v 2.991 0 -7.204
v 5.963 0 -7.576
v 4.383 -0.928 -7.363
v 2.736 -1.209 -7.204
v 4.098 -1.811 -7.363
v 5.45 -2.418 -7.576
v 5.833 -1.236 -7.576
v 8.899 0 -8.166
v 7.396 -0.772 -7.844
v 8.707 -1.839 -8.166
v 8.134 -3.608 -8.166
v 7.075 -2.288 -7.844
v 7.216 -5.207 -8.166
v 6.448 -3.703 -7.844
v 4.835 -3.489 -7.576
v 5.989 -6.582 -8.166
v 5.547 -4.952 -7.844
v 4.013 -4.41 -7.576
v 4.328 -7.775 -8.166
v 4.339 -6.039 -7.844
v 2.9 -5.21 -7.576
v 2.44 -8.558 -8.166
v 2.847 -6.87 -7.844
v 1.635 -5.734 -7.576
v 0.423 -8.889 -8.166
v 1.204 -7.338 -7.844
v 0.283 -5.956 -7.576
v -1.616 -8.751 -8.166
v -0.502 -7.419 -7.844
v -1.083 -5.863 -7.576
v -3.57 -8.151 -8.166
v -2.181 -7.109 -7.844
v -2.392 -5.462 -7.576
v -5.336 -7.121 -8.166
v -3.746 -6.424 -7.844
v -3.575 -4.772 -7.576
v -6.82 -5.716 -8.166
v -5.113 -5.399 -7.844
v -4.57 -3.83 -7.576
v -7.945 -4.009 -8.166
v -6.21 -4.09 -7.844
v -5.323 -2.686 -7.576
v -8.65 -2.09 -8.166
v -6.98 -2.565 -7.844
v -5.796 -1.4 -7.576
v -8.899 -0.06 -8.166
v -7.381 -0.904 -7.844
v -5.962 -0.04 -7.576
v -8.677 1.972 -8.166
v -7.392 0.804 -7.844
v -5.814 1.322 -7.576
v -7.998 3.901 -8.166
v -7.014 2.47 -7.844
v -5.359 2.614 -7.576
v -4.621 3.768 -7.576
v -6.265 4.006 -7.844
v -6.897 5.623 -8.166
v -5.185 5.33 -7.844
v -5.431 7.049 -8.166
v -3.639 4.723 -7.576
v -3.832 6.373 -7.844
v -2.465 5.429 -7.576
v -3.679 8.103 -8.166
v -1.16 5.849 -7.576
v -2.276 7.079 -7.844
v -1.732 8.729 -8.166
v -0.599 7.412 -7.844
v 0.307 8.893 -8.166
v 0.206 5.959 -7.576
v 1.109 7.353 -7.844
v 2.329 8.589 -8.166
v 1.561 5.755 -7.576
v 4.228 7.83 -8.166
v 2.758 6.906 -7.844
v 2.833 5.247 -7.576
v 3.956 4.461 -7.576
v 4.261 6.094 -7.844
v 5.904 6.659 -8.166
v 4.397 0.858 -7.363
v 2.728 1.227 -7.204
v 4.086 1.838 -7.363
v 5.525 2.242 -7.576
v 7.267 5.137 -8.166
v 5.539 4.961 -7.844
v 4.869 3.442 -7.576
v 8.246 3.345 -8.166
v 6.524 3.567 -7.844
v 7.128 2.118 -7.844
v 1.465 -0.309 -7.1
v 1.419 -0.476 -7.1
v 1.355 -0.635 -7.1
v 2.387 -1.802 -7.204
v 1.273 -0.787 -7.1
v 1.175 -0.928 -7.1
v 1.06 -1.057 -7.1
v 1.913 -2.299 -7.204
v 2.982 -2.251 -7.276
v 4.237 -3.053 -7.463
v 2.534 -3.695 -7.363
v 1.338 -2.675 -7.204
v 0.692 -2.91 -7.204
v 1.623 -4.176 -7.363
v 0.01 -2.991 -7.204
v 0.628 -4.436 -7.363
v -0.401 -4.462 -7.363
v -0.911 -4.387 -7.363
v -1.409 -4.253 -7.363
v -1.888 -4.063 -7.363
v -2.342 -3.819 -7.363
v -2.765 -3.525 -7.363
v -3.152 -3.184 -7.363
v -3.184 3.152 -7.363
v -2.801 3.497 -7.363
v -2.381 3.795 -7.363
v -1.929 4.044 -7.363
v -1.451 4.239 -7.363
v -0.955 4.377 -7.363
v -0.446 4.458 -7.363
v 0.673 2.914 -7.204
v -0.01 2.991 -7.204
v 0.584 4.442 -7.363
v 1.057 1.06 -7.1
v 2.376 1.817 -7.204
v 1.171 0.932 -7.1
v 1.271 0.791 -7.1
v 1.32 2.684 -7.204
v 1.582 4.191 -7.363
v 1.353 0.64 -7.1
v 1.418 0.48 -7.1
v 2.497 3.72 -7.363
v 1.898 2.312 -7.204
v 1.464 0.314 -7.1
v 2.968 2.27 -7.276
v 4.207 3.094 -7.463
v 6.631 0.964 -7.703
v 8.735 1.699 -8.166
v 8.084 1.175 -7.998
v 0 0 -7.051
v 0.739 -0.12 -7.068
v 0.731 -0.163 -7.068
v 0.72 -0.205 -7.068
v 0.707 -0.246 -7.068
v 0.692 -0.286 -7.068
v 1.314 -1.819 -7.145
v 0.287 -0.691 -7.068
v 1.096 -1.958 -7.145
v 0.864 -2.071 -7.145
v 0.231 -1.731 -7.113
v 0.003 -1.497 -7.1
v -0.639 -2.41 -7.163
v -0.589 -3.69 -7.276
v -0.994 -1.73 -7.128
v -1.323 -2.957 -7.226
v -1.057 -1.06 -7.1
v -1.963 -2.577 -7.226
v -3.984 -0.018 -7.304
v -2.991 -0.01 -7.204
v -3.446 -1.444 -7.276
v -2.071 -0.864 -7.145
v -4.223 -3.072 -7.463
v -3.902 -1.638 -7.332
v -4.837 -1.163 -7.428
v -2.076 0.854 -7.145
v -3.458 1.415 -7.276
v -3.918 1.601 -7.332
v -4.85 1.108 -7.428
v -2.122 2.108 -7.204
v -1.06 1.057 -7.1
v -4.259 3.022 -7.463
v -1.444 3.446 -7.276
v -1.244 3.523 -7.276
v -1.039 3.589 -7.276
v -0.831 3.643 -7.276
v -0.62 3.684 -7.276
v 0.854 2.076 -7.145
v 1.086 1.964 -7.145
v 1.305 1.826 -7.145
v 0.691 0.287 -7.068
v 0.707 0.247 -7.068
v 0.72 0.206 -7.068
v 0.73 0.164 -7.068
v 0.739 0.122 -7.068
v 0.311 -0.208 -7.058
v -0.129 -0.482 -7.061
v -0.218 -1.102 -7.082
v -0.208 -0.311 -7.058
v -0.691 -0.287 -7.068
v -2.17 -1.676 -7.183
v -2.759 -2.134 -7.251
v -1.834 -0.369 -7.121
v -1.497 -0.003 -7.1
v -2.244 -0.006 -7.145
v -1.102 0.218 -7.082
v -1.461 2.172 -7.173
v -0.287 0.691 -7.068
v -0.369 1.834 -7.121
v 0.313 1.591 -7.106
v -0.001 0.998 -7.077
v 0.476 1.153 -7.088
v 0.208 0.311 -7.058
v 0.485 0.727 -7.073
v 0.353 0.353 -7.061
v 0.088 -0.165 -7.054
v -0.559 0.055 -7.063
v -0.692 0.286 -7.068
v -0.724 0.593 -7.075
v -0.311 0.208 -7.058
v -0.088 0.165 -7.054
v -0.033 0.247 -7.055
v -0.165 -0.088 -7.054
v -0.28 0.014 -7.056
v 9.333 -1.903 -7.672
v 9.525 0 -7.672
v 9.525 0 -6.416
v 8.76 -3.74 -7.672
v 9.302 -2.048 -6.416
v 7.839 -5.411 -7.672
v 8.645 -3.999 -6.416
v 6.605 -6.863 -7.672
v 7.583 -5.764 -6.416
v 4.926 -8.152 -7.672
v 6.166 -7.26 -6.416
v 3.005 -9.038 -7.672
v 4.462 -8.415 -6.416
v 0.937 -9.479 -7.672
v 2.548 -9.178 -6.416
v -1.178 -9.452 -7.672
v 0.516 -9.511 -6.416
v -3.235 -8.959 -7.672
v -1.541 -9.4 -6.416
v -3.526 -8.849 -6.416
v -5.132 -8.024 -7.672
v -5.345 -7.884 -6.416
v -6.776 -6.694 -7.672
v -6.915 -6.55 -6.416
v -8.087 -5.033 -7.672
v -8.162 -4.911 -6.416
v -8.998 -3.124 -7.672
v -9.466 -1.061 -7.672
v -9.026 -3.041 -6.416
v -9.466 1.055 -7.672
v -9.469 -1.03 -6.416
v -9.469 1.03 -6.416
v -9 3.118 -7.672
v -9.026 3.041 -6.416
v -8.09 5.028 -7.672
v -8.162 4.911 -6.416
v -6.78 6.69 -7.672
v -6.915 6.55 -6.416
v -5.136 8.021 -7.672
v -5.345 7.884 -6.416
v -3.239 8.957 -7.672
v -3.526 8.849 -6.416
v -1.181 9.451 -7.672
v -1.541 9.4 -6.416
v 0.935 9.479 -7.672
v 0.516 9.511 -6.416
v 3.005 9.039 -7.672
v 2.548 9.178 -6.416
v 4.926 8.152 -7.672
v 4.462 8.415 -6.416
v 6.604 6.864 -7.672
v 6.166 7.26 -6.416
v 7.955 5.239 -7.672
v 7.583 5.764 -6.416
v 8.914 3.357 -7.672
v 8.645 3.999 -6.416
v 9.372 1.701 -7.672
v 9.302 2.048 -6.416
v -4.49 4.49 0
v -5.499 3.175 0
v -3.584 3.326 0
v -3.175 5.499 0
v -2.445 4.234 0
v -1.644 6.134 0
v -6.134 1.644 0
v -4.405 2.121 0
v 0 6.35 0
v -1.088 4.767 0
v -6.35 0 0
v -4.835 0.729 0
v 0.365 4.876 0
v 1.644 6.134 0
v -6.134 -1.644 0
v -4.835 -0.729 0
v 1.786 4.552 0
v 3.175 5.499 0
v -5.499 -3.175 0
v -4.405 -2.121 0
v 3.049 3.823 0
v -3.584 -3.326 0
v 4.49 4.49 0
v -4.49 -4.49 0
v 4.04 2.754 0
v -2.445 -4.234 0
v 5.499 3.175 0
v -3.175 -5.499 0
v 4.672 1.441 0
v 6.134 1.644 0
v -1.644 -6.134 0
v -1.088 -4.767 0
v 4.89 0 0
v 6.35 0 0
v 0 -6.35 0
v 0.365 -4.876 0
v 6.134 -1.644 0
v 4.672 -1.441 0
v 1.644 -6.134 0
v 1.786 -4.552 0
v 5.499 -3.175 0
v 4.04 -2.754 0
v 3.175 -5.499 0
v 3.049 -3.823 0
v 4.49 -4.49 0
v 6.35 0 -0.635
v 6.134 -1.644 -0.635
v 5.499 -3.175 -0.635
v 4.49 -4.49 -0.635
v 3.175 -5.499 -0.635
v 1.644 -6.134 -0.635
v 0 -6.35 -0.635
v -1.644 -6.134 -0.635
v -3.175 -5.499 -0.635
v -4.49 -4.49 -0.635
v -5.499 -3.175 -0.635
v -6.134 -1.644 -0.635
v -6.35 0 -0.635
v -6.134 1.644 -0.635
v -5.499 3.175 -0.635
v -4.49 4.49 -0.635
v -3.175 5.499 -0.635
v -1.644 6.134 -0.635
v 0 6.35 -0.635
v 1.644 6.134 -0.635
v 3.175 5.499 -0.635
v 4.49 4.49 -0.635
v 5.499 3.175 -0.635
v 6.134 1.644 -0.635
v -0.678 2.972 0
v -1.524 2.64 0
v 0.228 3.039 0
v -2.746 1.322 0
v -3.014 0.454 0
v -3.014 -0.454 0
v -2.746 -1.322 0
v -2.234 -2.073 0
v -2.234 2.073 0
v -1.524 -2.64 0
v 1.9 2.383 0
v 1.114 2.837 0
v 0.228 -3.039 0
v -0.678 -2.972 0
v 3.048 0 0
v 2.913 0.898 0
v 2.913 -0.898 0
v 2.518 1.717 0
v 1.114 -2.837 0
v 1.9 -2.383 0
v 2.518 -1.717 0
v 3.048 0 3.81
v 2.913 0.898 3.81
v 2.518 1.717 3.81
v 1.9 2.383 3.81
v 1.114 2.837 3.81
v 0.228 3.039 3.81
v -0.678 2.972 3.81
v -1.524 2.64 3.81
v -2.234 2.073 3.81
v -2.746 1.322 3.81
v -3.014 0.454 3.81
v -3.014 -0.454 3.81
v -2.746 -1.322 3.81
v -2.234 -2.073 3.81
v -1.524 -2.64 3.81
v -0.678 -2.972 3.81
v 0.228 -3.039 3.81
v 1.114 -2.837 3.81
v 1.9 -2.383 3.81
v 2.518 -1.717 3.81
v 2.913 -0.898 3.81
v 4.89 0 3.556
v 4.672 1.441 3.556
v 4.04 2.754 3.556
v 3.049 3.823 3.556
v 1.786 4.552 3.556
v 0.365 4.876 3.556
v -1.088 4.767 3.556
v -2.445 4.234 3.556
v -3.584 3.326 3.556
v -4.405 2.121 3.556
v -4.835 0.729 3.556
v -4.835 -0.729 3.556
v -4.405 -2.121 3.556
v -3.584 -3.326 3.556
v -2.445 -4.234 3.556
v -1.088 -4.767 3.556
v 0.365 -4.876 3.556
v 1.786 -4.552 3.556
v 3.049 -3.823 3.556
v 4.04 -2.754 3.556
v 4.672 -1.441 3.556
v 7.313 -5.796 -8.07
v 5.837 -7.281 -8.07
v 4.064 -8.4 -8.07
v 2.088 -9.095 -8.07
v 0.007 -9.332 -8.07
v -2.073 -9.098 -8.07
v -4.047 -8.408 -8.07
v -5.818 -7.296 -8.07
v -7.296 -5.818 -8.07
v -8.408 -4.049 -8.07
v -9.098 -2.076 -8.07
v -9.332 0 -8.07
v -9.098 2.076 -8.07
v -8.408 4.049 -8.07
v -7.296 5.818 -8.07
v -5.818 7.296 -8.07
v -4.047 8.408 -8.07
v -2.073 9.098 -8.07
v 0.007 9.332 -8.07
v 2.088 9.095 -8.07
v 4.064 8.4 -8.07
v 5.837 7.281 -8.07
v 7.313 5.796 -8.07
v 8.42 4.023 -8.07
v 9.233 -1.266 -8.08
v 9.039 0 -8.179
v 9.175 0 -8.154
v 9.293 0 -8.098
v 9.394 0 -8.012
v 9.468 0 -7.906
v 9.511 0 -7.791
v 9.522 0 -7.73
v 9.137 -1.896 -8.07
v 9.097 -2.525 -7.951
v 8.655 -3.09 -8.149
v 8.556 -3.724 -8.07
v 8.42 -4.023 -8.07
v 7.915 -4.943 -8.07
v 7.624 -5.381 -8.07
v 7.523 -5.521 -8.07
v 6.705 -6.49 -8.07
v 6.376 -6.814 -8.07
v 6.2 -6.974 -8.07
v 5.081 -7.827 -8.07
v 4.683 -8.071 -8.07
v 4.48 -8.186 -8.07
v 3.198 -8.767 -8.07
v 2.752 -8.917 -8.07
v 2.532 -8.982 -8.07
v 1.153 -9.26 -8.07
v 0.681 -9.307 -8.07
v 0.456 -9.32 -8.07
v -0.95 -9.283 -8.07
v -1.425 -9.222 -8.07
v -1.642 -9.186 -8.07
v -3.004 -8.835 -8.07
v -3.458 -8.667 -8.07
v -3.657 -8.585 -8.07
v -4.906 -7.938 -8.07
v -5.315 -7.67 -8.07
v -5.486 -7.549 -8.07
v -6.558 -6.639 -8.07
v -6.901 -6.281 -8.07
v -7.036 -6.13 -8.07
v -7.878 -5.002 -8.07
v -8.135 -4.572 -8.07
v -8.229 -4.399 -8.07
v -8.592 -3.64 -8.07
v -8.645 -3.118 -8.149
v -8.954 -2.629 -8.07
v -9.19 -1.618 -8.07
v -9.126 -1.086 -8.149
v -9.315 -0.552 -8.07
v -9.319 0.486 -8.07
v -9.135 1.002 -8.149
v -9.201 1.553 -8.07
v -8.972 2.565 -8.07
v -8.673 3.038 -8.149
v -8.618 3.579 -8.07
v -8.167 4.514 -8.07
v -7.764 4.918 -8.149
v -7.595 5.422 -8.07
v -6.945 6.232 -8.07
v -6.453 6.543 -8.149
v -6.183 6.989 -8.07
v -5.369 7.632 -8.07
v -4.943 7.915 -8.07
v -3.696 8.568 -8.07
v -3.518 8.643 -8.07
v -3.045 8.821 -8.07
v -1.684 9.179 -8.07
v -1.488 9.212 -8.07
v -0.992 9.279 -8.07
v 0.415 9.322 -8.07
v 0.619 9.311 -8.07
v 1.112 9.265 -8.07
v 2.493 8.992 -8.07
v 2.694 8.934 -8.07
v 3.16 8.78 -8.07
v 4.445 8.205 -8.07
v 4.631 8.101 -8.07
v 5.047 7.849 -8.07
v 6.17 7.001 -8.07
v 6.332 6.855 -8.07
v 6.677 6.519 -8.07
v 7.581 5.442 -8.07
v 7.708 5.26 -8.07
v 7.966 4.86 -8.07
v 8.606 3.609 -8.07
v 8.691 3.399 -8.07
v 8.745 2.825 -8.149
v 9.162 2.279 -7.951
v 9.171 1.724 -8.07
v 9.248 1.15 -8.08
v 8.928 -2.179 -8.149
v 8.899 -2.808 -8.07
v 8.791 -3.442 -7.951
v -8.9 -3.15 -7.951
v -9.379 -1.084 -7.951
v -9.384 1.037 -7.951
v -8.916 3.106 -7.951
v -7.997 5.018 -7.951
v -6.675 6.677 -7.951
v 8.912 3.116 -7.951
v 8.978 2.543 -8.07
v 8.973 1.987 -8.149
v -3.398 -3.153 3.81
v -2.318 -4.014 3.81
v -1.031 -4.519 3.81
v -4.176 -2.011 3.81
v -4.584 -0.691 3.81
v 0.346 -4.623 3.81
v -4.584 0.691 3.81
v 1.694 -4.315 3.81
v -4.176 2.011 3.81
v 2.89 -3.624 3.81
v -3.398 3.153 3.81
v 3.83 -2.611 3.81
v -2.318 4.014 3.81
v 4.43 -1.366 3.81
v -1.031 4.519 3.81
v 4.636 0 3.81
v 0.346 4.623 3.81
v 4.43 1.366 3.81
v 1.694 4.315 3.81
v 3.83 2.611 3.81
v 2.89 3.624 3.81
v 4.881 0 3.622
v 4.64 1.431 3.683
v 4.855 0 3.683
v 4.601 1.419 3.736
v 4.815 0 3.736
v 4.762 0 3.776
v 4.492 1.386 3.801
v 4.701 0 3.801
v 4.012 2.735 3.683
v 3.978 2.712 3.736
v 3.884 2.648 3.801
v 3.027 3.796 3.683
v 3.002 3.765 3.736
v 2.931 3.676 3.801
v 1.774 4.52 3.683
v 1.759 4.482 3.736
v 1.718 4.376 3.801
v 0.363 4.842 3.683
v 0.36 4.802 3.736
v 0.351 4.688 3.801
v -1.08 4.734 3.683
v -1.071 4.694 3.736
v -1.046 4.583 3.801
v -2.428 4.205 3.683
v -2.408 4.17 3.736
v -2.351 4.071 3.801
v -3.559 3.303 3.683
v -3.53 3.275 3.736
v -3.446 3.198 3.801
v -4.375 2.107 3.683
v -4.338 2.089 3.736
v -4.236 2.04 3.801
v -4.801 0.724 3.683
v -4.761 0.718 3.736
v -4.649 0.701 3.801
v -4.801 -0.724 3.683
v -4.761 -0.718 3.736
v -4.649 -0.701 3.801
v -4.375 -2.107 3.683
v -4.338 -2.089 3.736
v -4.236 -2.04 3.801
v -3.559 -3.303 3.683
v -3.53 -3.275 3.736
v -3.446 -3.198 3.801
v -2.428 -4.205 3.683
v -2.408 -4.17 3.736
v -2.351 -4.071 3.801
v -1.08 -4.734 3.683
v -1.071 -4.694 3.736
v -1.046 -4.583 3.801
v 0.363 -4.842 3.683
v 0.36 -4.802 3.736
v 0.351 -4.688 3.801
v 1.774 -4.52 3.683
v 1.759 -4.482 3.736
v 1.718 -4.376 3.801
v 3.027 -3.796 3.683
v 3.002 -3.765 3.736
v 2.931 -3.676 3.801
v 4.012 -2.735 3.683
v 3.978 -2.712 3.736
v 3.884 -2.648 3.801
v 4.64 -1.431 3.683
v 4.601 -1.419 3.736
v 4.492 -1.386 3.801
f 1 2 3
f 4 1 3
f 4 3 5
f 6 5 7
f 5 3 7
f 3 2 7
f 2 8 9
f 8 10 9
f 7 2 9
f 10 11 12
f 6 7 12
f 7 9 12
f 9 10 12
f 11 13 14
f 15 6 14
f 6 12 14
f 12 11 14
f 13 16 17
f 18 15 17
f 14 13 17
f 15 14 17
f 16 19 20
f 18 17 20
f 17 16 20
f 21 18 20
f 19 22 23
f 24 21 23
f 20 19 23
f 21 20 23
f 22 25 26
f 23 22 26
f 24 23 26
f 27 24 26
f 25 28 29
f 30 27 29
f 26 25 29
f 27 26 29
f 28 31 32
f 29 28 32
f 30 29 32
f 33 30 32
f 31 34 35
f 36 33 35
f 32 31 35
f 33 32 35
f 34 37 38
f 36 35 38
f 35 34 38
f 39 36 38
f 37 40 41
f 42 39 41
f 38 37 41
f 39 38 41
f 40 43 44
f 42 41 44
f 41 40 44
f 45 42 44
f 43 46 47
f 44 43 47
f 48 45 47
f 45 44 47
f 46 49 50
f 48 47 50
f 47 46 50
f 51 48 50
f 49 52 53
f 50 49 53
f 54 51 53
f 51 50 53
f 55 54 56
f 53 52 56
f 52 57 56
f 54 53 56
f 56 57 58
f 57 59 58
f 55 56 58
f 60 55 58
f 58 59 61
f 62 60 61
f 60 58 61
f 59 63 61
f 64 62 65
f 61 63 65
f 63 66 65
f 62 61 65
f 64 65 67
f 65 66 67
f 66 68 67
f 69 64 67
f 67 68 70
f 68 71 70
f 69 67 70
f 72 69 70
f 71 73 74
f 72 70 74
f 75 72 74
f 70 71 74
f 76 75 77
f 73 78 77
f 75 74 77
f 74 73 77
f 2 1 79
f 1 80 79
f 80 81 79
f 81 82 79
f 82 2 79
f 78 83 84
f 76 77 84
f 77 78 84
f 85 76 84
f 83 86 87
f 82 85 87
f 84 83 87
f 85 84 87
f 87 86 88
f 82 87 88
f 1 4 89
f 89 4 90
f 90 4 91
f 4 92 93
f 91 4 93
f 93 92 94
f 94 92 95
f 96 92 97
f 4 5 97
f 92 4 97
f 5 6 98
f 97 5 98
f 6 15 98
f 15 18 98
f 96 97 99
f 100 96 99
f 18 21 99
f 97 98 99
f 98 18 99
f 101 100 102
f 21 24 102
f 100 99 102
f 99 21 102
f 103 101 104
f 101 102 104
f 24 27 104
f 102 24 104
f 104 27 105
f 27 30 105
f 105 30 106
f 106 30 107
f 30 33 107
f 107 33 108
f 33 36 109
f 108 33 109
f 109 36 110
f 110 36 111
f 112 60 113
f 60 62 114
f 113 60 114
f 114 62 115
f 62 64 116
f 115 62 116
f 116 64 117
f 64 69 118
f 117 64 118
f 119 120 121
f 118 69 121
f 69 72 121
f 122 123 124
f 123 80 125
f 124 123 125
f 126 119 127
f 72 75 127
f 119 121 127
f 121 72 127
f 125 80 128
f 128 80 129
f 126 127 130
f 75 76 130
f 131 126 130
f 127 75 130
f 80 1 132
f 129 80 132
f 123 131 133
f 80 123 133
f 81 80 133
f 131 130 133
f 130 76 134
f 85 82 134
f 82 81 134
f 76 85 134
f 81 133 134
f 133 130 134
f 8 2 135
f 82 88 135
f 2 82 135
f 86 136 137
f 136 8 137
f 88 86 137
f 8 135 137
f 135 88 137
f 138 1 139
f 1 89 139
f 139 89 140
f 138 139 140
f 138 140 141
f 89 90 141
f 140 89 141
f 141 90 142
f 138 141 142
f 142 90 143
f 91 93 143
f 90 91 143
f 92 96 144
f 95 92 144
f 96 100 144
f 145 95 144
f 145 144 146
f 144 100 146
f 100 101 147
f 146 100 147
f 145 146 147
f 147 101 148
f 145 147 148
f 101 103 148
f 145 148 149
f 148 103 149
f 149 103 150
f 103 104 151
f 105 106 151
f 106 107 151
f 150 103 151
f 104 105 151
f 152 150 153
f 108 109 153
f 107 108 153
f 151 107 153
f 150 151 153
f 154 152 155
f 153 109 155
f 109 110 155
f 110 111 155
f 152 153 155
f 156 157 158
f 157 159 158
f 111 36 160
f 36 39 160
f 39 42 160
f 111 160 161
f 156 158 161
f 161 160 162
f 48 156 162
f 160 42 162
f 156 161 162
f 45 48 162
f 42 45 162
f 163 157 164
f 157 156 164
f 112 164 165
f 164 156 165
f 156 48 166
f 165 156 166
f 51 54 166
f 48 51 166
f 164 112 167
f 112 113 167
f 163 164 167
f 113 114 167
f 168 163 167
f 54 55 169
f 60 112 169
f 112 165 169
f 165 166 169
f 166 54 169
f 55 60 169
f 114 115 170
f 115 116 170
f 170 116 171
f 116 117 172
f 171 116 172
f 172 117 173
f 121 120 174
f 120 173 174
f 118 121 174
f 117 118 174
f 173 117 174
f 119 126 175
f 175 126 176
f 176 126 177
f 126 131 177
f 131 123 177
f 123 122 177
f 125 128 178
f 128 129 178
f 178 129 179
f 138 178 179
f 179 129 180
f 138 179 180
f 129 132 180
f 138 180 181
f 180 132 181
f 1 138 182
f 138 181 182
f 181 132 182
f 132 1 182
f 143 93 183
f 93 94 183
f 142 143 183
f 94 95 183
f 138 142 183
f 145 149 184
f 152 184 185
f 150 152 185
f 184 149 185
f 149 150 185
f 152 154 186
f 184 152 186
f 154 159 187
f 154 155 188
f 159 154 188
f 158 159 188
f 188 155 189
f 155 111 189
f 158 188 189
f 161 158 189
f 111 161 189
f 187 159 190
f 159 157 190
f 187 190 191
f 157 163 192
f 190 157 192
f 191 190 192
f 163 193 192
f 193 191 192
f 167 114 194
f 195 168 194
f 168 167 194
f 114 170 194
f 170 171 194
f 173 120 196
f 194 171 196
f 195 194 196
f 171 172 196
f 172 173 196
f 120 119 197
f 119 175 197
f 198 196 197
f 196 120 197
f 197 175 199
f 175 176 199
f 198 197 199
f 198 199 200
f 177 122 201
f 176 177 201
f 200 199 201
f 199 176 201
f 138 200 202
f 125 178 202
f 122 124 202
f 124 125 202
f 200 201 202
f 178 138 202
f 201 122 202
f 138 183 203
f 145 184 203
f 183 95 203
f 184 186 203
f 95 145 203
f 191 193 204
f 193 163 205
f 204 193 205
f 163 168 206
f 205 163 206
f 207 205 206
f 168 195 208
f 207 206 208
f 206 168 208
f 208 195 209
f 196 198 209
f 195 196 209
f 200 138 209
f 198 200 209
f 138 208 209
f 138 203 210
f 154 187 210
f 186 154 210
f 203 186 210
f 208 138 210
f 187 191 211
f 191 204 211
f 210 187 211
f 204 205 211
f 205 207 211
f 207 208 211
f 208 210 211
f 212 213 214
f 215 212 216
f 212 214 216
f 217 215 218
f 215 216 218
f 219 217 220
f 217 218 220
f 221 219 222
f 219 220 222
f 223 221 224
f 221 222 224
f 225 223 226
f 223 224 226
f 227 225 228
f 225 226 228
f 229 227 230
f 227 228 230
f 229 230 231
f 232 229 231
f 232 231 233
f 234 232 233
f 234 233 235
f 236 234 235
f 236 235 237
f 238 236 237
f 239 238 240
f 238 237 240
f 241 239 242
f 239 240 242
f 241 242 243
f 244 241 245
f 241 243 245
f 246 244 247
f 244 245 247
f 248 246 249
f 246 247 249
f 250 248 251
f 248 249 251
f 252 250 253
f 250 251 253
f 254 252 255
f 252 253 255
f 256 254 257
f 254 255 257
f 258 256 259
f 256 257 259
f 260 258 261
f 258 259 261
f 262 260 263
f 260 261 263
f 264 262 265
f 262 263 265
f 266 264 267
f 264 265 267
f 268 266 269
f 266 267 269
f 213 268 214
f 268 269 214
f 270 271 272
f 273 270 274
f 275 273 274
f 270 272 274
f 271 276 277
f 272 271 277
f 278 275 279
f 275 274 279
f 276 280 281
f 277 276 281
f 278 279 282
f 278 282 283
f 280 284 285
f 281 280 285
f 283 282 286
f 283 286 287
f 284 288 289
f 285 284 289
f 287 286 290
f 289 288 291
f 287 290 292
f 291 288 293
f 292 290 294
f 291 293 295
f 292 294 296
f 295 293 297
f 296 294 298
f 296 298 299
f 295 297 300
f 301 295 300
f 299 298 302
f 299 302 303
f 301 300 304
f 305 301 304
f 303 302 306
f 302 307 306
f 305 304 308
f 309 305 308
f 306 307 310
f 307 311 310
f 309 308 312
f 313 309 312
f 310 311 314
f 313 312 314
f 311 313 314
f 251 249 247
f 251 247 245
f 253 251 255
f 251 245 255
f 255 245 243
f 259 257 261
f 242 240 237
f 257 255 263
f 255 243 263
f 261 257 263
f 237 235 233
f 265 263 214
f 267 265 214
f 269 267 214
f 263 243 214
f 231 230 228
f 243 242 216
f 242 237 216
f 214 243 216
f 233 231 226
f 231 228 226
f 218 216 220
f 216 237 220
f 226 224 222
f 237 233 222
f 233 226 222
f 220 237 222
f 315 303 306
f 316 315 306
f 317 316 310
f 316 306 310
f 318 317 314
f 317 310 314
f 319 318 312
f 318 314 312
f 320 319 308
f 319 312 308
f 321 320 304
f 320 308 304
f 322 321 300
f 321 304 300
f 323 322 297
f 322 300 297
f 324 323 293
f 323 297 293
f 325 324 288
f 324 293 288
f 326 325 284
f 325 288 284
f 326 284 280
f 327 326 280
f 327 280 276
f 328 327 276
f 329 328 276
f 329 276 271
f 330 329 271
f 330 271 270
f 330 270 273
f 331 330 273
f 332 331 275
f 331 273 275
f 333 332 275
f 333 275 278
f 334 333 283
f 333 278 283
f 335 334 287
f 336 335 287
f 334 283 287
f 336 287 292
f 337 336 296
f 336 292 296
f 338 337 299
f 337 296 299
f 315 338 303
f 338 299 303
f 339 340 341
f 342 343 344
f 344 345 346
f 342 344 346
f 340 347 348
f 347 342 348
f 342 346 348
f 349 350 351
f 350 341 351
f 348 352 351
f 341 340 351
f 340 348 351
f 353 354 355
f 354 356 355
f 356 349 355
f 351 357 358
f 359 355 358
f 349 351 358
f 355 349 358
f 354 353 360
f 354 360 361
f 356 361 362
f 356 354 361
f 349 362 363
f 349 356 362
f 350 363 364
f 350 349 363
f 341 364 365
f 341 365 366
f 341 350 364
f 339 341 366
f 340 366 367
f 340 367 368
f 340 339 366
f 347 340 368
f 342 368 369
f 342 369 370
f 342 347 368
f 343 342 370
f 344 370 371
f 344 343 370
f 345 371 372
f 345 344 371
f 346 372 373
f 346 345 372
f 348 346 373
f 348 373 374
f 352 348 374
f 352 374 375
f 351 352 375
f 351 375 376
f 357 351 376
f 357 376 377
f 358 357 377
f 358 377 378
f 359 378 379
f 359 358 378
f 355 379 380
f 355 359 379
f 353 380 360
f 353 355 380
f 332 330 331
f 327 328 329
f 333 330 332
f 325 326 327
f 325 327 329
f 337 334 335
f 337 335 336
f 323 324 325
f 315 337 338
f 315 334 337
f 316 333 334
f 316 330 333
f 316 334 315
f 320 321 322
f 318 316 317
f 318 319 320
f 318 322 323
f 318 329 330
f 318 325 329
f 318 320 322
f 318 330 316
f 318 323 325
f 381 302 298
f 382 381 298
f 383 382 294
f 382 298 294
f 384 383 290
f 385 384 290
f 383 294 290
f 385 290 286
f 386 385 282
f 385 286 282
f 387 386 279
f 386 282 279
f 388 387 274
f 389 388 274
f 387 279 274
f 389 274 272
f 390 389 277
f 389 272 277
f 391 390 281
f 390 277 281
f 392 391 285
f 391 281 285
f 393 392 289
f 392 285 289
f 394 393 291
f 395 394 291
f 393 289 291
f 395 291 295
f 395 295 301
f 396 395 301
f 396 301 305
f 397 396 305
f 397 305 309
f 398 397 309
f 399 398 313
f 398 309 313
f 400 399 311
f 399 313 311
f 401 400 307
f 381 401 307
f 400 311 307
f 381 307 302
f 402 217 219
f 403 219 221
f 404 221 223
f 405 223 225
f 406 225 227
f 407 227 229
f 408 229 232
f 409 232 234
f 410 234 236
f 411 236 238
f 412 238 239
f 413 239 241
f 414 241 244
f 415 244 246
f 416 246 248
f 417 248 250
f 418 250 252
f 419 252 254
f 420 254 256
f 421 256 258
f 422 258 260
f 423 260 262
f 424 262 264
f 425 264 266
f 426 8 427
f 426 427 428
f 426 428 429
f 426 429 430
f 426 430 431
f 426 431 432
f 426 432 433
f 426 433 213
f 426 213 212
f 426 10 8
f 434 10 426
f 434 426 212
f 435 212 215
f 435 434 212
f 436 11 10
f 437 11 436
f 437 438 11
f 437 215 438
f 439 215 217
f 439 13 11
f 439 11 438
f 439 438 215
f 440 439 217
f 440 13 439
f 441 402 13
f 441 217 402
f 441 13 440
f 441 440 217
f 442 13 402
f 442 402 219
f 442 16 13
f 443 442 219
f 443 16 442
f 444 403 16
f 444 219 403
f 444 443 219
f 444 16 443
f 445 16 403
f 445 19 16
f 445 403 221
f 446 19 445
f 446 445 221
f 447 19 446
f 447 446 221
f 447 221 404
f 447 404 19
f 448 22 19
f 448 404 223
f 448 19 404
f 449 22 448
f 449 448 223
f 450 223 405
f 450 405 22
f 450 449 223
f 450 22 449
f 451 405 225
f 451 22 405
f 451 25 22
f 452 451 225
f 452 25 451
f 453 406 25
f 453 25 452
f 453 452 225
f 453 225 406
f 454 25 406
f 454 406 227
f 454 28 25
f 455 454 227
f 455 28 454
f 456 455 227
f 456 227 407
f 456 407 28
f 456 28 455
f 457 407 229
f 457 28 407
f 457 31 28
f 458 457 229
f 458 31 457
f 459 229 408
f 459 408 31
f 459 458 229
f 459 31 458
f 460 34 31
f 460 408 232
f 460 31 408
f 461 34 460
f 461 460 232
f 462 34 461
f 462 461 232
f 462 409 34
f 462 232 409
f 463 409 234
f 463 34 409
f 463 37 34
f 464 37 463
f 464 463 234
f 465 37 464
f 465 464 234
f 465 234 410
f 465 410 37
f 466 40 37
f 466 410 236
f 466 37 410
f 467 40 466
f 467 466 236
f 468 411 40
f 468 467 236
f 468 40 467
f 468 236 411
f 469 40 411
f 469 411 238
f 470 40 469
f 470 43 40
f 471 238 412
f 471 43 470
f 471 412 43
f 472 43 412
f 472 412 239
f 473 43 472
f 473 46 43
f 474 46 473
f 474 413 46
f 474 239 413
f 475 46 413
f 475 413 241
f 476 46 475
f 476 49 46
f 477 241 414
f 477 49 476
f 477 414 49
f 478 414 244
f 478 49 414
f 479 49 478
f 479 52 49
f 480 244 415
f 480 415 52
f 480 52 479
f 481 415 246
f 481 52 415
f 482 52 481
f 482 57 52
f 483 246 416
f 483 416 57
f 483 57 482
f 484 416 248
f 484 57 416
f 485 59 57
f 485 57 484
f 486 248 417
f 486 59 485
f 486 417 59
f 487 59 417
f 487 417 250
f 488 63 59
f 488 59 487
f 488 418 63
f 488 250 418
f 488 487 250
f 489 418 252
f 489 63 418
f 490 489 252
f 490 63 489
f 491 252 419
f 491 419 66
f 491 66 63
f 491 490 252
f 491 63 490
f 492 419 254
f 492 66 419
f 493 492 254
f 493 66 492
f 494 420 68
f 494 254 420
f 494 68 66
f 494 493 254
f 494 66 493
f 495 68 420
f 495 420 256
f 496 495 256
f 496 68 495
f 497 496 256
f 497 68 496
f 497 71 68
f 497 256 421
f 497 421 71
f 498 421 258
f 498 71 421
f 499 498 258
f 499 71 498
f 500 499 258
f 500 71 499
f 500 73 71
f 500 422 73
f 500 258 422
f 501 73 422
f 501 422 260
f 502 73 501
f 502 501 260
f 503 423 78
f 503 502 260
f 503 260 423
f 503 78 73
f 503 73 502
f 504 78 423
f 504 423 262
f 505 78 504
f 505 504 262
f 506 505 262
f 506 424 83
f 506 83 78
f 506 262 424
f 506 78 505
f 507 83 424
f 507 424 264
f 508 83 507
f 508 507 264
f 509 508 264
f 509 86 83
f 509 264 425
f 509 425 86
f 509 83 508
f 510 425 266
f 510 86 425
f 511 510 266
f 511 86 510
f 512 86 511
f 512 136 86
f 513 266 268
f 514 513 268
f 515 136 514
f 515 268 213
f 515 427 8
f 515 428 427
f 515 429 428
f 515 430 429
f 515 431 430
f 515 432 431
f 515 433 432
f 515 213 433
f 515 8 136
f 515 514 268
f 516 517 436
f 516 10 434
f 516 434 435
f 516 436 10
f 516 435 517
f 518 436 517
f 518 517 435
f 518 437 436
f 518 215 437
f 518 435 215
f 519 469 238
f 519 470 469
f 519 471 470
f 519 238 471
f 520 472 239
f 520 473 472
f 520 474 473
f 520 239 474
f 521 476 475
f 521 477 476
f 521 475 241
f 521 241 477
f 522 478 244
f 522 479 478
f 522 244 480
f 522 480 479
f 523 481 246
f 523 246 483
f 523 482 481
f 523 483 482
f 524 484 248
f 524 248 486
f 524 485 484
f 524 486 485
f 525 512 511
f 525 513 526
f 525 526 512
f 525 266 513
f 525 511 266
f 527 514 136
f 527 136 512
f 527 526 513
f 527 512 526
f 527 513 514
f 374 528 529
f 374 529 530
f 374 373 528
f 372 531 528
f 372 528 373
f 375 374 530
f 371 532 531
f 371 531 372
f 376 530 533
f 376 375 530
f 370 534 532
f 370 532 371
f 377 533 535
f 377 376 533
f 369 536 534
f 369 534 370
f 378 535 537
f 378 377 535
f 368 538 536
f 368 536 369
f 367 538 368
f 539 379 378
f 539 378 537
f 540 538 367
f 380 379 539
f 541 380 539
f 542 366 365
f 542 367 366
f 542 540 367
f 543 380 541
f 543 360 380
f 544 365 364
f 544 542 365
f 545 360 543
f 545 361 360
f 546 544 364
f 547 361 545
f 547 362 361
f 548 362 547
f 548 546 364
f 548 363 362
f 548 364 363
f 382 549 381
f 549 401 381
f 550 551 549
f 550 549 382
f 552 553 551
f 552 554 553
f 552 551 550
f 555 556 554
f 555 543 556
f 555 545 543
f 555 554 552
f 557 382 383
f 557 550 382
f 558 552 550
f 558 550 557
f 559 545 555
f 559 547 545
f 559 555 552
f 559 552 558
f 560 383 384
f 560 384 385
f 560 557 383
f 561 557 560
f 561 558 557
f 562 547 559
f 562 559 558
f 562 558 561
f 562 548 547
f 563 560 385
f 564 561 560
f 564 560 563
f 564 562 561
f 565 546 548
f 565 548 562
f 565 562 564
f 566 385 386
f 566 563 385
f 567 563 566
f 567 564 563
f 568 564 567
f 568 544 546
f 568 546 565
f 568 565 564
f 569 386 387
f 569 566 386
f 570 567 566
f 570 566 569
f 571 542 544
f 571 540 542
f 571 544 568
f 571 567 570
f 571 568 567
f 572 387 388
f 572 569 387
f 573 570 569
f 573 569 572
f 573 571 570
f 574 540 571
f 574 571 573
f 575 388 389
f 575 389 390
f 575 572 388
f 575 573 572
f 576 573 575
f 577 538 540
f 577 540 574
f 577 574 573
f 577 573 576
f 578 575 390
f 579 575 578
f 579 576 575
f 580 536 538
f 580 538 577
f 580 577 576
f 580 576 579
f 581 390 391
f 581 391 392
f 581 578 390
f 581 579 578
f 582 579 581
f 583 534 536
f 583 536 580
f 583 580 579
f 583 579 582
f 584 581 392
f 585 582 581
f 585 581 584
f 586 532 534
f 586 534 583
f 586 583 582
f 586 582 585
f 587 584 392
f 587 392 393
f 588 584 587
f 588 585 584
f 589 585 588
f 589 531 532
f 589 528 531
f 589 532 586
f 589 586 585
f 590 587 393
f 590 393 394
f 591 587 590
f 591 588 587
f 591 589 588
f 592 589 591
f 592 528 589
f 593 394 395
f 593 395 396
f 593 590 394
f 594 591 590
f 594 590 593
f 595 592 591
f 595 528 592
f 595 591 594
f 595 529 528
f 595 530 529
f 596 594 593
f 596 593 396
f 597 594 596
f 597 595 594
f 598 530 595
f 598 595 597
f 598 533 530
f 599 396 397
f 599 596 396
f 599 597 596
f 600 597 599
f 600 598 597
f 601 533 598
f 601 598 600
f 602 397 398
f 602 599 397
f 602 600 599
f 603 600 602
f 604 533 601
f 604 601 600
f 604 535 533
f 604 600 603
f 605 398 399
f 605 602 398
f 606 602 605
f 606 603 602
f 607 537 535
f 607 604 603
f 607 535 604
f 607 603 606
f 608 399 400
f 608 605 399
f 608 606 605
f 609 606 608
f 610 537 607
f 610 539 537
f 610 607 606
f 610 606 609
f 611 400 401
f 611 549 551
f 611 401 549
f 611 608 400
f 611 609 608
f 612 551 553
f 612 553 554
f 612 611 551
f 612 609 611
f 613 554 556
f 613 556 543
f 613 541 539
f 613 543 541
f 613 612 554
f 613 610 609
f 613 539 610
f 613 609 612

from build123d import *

# Parameters (mm, degrees)
F0_R     = 4.8895
F0_R_2   = 3.048
F1_DEPTH = 3.81
F2_R     = 6.35
F2_R_2   = 4.8895
F2_R_3   = 3.048
F3_DEPTH = 0.635
F6_R     = 0.508
F7_R     = 0.254


with BuildPart() as f1:
    # F0 (on Top) → F1 (new body)
    with BuildSketch(Plane.XY):
        Circle(F0_R)
        Circle(F0_R_2, mode=Mode.SUBTRACT)
    extrude(amount=F1_DEPTH)

    # F2 (on face) → F3 (join)
    with BuildSketch(Plane(origin=(0, 0, 0), x_dir=(1, 0, 0), z_dir=(0, 0, -1))):
        Circle(F2_R)
        Circle(F2_R_2, mode=Mode.SUBTRACT)
        Circle(F2_R_2)
        Circle(F2_R_3, mode=Mode.SUBTRACT)
        Circle(F2_R_3)
    extrude(amount=F3_DEPTH)

    # F7
    f7_edges = [f1.edges().sort_by_distance(p)[0] for p in [
        (-4.8895, 0, 3.81),
    ]]
    fillet(f7_edges, radius=F7_R)


with BuildPart() as f5:
    # F4 (on Front) → F5 (revolve)
    with BuildSketch(Plane.XZ):
        with BuildLine():
            Line((9.525, -6.4157823257), (0, -6.4157823257))
            Line((0, -6.4157823257), (0, -7.0507823257))
            ThreePointArc((0, -7.0507823257), (4.8000755161, -7.403965955), (9.525, -8.3207823257))
            Line((9.525, -8.3207823257), (9.525, -6.4157823257))
        make_face()
    revolve(axis=Axis((0, 0, -0.635), (0, 0, -1)))

    # F6
    f6_edges = [f5.edges().sort_by_distance(p)[0] for p in [
        (-9.525, 0, -8.320782),
    ]]
    fillet(f6_edges, radius=F6_R)


solid = Compound([f1.part, f5.part])
